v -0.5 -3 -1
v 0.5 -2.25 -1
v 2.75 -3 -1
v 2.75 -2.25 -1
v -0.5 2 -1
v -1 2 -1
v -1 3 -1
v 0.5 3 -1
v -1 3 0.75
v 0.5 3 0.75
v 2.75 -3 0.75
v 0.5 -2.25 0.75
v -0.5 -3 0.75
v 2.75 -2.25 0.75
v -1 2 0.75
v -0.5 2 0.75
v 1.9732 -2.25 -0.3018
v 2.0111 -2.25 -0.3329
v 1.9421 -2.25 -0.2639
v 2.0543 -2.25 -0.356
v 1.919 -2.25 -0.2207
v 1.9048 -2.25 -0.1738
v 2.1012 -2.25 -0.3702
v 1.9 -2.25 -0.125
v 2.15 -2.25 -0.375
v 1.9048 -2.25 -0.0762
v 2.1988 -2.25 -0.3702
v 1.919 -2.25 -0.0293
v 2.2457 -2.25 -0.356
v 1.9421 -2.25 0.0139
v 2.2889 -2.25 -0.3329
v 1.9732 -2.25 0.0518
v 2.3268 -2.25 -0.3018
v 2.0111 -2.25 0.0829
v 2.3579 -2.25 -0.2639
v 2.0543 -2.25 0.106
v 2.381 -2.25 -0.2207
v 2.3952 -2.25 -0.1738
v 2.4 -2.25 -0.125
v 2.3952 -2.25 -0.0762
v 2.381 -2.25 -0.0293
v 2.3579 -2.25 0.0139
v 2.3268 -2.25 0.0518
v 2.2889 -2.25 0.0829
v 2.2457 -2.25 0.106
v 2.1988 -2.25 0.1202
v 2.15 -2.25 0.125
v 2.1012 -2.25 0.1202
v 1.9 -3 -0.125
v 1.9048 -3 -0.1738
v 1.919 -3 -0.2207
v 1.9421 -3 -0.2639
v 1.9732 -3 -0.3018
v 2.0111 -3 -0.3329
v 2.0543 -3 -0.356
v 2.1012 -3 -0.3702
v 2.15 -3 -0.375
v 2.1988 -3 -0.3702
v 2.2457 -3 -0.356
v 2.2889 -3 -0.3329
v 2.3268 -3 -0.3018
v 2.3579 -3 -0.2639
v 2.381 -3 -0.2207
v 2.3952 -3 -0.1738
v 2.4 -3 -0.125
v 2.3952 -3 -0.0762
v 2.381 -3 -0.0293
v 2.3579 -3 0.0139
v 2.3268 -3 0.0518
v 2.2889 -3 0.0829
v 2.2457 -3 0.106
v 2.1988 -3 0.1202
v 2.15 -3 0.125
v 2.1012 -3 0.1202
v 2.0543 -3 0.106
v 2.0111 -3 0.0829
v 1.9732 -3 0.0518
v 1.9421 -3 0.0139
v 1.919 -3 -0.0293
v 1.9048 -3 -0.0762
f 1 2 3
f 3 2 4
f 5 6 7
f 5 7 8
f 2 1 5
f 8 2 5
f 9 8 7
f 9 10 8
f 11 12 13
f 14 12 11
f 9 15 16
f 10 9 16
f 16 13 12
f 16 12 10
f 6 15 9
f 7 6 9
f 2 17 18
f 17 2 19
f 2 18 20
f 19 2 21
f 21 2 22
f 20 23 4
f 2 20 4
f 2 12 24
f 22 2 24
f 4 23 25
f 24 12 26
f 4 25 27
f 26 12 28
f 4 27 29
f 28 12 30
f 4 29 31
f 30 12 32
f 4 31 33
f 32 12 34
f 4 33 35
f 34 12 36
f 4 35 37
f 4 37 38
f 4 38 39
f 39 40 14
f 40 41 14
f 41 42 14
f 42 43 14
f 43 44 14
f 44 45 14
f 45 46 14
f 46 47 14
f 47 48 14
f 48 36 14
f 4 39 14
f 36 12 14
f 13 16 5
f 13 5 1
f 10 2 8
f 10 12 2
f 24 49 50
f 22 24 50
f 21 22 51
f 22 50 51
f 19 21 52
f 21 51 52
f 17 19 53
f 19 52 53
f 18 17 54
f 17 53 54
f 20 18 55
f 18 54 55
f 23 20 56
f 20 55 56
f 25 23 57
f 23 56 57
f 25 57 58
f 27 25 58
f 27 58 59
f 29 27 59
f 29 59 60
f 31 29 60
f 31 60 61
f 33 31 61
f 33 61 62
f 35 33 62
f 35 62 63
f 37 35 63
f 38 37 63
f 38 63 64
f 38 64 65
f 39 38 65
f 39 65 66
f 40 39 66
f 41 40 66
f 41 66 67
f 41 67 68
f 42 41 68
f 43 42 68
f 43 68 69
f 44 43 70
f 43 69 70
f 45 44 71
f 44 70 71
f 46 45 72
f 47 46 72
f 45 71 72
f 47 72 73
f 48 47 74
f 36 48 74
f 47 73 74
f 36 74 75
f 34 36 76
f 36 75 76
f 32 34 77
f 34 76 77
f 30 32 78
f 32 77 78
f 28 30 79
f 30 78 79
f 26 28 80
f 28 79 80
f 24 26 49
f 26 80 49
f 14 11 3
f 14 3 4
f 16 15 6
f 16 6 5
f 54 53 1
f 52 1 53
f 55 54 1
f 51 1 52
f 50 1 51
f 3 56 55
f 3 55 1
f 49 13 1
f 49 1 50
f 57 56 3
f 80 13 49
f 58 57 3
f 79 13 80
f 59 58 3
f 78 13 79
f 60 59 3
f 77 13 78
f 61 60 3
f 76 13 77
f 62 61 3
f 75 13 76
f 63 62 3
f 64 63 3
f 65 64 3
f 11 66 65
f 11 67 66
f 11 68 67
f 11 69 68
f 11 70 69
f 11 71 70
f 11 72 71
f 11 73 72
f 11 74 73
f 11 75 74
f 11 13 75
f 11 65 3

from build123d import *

# Parameters (mm, degrees)
SKETCH1_W                      = 0.5
SKETCH1_H                      = 1
SKETCH1_W_2                    = 2.25
SKETCH1_H_2                    = 0.75
BOSS_EXTRUDE1_DEPTH            = 0.75
BOSS_EXTRUDE1_DEPTH_BACK       = 1
F_0_5_0_5_DIAMETER_HOLE1_D     = 0.5
F_0_5_0_5_DIAMETER_HOLE1_DEPTH = 0.75


with BuildPart() as part:
    # Sketch1 → Boss-Extrude1 (new body, two sides)
    with BuildSketch(Plane.XY) as boss_extrude1_sk:
        Polygon((0.5, 3), (-0.5, 3), (-0.5, 2), (-0.5, -3), (0.5, -3), (0.5, -2.25), align=None)
        with Locations((-0.75, 2.5)):
            Rectangle(SKETCH1_W, SKETCH1_H)
        with Locations((1.625, -2.625)):
            Rectangle(SKETCH1_W_2, SKETCH1_H_2)
    extrude(amount=BOSS_EXTRUDE1_DEPTH)
    extrude(boss_extrude1_sk.sketch, amount=-BOSS_EXTRUDE1_DEPTH_BACK)

    # Ø0.5 (0.5) Diameter Hole1
    with Locations(Plane(origin=(0, -2.25, 0), x_dir=(1, 0, 0), z_dir=(0, 1, 0))):
        with Locations((2.15, 0.125)):
            Hole(F_0_5_0_5_DIAMETER_HOLE1_D / 2, depth=F_0_5_0_5_DIAMETER_HOLE1_DEPTH)


solid = part.part
